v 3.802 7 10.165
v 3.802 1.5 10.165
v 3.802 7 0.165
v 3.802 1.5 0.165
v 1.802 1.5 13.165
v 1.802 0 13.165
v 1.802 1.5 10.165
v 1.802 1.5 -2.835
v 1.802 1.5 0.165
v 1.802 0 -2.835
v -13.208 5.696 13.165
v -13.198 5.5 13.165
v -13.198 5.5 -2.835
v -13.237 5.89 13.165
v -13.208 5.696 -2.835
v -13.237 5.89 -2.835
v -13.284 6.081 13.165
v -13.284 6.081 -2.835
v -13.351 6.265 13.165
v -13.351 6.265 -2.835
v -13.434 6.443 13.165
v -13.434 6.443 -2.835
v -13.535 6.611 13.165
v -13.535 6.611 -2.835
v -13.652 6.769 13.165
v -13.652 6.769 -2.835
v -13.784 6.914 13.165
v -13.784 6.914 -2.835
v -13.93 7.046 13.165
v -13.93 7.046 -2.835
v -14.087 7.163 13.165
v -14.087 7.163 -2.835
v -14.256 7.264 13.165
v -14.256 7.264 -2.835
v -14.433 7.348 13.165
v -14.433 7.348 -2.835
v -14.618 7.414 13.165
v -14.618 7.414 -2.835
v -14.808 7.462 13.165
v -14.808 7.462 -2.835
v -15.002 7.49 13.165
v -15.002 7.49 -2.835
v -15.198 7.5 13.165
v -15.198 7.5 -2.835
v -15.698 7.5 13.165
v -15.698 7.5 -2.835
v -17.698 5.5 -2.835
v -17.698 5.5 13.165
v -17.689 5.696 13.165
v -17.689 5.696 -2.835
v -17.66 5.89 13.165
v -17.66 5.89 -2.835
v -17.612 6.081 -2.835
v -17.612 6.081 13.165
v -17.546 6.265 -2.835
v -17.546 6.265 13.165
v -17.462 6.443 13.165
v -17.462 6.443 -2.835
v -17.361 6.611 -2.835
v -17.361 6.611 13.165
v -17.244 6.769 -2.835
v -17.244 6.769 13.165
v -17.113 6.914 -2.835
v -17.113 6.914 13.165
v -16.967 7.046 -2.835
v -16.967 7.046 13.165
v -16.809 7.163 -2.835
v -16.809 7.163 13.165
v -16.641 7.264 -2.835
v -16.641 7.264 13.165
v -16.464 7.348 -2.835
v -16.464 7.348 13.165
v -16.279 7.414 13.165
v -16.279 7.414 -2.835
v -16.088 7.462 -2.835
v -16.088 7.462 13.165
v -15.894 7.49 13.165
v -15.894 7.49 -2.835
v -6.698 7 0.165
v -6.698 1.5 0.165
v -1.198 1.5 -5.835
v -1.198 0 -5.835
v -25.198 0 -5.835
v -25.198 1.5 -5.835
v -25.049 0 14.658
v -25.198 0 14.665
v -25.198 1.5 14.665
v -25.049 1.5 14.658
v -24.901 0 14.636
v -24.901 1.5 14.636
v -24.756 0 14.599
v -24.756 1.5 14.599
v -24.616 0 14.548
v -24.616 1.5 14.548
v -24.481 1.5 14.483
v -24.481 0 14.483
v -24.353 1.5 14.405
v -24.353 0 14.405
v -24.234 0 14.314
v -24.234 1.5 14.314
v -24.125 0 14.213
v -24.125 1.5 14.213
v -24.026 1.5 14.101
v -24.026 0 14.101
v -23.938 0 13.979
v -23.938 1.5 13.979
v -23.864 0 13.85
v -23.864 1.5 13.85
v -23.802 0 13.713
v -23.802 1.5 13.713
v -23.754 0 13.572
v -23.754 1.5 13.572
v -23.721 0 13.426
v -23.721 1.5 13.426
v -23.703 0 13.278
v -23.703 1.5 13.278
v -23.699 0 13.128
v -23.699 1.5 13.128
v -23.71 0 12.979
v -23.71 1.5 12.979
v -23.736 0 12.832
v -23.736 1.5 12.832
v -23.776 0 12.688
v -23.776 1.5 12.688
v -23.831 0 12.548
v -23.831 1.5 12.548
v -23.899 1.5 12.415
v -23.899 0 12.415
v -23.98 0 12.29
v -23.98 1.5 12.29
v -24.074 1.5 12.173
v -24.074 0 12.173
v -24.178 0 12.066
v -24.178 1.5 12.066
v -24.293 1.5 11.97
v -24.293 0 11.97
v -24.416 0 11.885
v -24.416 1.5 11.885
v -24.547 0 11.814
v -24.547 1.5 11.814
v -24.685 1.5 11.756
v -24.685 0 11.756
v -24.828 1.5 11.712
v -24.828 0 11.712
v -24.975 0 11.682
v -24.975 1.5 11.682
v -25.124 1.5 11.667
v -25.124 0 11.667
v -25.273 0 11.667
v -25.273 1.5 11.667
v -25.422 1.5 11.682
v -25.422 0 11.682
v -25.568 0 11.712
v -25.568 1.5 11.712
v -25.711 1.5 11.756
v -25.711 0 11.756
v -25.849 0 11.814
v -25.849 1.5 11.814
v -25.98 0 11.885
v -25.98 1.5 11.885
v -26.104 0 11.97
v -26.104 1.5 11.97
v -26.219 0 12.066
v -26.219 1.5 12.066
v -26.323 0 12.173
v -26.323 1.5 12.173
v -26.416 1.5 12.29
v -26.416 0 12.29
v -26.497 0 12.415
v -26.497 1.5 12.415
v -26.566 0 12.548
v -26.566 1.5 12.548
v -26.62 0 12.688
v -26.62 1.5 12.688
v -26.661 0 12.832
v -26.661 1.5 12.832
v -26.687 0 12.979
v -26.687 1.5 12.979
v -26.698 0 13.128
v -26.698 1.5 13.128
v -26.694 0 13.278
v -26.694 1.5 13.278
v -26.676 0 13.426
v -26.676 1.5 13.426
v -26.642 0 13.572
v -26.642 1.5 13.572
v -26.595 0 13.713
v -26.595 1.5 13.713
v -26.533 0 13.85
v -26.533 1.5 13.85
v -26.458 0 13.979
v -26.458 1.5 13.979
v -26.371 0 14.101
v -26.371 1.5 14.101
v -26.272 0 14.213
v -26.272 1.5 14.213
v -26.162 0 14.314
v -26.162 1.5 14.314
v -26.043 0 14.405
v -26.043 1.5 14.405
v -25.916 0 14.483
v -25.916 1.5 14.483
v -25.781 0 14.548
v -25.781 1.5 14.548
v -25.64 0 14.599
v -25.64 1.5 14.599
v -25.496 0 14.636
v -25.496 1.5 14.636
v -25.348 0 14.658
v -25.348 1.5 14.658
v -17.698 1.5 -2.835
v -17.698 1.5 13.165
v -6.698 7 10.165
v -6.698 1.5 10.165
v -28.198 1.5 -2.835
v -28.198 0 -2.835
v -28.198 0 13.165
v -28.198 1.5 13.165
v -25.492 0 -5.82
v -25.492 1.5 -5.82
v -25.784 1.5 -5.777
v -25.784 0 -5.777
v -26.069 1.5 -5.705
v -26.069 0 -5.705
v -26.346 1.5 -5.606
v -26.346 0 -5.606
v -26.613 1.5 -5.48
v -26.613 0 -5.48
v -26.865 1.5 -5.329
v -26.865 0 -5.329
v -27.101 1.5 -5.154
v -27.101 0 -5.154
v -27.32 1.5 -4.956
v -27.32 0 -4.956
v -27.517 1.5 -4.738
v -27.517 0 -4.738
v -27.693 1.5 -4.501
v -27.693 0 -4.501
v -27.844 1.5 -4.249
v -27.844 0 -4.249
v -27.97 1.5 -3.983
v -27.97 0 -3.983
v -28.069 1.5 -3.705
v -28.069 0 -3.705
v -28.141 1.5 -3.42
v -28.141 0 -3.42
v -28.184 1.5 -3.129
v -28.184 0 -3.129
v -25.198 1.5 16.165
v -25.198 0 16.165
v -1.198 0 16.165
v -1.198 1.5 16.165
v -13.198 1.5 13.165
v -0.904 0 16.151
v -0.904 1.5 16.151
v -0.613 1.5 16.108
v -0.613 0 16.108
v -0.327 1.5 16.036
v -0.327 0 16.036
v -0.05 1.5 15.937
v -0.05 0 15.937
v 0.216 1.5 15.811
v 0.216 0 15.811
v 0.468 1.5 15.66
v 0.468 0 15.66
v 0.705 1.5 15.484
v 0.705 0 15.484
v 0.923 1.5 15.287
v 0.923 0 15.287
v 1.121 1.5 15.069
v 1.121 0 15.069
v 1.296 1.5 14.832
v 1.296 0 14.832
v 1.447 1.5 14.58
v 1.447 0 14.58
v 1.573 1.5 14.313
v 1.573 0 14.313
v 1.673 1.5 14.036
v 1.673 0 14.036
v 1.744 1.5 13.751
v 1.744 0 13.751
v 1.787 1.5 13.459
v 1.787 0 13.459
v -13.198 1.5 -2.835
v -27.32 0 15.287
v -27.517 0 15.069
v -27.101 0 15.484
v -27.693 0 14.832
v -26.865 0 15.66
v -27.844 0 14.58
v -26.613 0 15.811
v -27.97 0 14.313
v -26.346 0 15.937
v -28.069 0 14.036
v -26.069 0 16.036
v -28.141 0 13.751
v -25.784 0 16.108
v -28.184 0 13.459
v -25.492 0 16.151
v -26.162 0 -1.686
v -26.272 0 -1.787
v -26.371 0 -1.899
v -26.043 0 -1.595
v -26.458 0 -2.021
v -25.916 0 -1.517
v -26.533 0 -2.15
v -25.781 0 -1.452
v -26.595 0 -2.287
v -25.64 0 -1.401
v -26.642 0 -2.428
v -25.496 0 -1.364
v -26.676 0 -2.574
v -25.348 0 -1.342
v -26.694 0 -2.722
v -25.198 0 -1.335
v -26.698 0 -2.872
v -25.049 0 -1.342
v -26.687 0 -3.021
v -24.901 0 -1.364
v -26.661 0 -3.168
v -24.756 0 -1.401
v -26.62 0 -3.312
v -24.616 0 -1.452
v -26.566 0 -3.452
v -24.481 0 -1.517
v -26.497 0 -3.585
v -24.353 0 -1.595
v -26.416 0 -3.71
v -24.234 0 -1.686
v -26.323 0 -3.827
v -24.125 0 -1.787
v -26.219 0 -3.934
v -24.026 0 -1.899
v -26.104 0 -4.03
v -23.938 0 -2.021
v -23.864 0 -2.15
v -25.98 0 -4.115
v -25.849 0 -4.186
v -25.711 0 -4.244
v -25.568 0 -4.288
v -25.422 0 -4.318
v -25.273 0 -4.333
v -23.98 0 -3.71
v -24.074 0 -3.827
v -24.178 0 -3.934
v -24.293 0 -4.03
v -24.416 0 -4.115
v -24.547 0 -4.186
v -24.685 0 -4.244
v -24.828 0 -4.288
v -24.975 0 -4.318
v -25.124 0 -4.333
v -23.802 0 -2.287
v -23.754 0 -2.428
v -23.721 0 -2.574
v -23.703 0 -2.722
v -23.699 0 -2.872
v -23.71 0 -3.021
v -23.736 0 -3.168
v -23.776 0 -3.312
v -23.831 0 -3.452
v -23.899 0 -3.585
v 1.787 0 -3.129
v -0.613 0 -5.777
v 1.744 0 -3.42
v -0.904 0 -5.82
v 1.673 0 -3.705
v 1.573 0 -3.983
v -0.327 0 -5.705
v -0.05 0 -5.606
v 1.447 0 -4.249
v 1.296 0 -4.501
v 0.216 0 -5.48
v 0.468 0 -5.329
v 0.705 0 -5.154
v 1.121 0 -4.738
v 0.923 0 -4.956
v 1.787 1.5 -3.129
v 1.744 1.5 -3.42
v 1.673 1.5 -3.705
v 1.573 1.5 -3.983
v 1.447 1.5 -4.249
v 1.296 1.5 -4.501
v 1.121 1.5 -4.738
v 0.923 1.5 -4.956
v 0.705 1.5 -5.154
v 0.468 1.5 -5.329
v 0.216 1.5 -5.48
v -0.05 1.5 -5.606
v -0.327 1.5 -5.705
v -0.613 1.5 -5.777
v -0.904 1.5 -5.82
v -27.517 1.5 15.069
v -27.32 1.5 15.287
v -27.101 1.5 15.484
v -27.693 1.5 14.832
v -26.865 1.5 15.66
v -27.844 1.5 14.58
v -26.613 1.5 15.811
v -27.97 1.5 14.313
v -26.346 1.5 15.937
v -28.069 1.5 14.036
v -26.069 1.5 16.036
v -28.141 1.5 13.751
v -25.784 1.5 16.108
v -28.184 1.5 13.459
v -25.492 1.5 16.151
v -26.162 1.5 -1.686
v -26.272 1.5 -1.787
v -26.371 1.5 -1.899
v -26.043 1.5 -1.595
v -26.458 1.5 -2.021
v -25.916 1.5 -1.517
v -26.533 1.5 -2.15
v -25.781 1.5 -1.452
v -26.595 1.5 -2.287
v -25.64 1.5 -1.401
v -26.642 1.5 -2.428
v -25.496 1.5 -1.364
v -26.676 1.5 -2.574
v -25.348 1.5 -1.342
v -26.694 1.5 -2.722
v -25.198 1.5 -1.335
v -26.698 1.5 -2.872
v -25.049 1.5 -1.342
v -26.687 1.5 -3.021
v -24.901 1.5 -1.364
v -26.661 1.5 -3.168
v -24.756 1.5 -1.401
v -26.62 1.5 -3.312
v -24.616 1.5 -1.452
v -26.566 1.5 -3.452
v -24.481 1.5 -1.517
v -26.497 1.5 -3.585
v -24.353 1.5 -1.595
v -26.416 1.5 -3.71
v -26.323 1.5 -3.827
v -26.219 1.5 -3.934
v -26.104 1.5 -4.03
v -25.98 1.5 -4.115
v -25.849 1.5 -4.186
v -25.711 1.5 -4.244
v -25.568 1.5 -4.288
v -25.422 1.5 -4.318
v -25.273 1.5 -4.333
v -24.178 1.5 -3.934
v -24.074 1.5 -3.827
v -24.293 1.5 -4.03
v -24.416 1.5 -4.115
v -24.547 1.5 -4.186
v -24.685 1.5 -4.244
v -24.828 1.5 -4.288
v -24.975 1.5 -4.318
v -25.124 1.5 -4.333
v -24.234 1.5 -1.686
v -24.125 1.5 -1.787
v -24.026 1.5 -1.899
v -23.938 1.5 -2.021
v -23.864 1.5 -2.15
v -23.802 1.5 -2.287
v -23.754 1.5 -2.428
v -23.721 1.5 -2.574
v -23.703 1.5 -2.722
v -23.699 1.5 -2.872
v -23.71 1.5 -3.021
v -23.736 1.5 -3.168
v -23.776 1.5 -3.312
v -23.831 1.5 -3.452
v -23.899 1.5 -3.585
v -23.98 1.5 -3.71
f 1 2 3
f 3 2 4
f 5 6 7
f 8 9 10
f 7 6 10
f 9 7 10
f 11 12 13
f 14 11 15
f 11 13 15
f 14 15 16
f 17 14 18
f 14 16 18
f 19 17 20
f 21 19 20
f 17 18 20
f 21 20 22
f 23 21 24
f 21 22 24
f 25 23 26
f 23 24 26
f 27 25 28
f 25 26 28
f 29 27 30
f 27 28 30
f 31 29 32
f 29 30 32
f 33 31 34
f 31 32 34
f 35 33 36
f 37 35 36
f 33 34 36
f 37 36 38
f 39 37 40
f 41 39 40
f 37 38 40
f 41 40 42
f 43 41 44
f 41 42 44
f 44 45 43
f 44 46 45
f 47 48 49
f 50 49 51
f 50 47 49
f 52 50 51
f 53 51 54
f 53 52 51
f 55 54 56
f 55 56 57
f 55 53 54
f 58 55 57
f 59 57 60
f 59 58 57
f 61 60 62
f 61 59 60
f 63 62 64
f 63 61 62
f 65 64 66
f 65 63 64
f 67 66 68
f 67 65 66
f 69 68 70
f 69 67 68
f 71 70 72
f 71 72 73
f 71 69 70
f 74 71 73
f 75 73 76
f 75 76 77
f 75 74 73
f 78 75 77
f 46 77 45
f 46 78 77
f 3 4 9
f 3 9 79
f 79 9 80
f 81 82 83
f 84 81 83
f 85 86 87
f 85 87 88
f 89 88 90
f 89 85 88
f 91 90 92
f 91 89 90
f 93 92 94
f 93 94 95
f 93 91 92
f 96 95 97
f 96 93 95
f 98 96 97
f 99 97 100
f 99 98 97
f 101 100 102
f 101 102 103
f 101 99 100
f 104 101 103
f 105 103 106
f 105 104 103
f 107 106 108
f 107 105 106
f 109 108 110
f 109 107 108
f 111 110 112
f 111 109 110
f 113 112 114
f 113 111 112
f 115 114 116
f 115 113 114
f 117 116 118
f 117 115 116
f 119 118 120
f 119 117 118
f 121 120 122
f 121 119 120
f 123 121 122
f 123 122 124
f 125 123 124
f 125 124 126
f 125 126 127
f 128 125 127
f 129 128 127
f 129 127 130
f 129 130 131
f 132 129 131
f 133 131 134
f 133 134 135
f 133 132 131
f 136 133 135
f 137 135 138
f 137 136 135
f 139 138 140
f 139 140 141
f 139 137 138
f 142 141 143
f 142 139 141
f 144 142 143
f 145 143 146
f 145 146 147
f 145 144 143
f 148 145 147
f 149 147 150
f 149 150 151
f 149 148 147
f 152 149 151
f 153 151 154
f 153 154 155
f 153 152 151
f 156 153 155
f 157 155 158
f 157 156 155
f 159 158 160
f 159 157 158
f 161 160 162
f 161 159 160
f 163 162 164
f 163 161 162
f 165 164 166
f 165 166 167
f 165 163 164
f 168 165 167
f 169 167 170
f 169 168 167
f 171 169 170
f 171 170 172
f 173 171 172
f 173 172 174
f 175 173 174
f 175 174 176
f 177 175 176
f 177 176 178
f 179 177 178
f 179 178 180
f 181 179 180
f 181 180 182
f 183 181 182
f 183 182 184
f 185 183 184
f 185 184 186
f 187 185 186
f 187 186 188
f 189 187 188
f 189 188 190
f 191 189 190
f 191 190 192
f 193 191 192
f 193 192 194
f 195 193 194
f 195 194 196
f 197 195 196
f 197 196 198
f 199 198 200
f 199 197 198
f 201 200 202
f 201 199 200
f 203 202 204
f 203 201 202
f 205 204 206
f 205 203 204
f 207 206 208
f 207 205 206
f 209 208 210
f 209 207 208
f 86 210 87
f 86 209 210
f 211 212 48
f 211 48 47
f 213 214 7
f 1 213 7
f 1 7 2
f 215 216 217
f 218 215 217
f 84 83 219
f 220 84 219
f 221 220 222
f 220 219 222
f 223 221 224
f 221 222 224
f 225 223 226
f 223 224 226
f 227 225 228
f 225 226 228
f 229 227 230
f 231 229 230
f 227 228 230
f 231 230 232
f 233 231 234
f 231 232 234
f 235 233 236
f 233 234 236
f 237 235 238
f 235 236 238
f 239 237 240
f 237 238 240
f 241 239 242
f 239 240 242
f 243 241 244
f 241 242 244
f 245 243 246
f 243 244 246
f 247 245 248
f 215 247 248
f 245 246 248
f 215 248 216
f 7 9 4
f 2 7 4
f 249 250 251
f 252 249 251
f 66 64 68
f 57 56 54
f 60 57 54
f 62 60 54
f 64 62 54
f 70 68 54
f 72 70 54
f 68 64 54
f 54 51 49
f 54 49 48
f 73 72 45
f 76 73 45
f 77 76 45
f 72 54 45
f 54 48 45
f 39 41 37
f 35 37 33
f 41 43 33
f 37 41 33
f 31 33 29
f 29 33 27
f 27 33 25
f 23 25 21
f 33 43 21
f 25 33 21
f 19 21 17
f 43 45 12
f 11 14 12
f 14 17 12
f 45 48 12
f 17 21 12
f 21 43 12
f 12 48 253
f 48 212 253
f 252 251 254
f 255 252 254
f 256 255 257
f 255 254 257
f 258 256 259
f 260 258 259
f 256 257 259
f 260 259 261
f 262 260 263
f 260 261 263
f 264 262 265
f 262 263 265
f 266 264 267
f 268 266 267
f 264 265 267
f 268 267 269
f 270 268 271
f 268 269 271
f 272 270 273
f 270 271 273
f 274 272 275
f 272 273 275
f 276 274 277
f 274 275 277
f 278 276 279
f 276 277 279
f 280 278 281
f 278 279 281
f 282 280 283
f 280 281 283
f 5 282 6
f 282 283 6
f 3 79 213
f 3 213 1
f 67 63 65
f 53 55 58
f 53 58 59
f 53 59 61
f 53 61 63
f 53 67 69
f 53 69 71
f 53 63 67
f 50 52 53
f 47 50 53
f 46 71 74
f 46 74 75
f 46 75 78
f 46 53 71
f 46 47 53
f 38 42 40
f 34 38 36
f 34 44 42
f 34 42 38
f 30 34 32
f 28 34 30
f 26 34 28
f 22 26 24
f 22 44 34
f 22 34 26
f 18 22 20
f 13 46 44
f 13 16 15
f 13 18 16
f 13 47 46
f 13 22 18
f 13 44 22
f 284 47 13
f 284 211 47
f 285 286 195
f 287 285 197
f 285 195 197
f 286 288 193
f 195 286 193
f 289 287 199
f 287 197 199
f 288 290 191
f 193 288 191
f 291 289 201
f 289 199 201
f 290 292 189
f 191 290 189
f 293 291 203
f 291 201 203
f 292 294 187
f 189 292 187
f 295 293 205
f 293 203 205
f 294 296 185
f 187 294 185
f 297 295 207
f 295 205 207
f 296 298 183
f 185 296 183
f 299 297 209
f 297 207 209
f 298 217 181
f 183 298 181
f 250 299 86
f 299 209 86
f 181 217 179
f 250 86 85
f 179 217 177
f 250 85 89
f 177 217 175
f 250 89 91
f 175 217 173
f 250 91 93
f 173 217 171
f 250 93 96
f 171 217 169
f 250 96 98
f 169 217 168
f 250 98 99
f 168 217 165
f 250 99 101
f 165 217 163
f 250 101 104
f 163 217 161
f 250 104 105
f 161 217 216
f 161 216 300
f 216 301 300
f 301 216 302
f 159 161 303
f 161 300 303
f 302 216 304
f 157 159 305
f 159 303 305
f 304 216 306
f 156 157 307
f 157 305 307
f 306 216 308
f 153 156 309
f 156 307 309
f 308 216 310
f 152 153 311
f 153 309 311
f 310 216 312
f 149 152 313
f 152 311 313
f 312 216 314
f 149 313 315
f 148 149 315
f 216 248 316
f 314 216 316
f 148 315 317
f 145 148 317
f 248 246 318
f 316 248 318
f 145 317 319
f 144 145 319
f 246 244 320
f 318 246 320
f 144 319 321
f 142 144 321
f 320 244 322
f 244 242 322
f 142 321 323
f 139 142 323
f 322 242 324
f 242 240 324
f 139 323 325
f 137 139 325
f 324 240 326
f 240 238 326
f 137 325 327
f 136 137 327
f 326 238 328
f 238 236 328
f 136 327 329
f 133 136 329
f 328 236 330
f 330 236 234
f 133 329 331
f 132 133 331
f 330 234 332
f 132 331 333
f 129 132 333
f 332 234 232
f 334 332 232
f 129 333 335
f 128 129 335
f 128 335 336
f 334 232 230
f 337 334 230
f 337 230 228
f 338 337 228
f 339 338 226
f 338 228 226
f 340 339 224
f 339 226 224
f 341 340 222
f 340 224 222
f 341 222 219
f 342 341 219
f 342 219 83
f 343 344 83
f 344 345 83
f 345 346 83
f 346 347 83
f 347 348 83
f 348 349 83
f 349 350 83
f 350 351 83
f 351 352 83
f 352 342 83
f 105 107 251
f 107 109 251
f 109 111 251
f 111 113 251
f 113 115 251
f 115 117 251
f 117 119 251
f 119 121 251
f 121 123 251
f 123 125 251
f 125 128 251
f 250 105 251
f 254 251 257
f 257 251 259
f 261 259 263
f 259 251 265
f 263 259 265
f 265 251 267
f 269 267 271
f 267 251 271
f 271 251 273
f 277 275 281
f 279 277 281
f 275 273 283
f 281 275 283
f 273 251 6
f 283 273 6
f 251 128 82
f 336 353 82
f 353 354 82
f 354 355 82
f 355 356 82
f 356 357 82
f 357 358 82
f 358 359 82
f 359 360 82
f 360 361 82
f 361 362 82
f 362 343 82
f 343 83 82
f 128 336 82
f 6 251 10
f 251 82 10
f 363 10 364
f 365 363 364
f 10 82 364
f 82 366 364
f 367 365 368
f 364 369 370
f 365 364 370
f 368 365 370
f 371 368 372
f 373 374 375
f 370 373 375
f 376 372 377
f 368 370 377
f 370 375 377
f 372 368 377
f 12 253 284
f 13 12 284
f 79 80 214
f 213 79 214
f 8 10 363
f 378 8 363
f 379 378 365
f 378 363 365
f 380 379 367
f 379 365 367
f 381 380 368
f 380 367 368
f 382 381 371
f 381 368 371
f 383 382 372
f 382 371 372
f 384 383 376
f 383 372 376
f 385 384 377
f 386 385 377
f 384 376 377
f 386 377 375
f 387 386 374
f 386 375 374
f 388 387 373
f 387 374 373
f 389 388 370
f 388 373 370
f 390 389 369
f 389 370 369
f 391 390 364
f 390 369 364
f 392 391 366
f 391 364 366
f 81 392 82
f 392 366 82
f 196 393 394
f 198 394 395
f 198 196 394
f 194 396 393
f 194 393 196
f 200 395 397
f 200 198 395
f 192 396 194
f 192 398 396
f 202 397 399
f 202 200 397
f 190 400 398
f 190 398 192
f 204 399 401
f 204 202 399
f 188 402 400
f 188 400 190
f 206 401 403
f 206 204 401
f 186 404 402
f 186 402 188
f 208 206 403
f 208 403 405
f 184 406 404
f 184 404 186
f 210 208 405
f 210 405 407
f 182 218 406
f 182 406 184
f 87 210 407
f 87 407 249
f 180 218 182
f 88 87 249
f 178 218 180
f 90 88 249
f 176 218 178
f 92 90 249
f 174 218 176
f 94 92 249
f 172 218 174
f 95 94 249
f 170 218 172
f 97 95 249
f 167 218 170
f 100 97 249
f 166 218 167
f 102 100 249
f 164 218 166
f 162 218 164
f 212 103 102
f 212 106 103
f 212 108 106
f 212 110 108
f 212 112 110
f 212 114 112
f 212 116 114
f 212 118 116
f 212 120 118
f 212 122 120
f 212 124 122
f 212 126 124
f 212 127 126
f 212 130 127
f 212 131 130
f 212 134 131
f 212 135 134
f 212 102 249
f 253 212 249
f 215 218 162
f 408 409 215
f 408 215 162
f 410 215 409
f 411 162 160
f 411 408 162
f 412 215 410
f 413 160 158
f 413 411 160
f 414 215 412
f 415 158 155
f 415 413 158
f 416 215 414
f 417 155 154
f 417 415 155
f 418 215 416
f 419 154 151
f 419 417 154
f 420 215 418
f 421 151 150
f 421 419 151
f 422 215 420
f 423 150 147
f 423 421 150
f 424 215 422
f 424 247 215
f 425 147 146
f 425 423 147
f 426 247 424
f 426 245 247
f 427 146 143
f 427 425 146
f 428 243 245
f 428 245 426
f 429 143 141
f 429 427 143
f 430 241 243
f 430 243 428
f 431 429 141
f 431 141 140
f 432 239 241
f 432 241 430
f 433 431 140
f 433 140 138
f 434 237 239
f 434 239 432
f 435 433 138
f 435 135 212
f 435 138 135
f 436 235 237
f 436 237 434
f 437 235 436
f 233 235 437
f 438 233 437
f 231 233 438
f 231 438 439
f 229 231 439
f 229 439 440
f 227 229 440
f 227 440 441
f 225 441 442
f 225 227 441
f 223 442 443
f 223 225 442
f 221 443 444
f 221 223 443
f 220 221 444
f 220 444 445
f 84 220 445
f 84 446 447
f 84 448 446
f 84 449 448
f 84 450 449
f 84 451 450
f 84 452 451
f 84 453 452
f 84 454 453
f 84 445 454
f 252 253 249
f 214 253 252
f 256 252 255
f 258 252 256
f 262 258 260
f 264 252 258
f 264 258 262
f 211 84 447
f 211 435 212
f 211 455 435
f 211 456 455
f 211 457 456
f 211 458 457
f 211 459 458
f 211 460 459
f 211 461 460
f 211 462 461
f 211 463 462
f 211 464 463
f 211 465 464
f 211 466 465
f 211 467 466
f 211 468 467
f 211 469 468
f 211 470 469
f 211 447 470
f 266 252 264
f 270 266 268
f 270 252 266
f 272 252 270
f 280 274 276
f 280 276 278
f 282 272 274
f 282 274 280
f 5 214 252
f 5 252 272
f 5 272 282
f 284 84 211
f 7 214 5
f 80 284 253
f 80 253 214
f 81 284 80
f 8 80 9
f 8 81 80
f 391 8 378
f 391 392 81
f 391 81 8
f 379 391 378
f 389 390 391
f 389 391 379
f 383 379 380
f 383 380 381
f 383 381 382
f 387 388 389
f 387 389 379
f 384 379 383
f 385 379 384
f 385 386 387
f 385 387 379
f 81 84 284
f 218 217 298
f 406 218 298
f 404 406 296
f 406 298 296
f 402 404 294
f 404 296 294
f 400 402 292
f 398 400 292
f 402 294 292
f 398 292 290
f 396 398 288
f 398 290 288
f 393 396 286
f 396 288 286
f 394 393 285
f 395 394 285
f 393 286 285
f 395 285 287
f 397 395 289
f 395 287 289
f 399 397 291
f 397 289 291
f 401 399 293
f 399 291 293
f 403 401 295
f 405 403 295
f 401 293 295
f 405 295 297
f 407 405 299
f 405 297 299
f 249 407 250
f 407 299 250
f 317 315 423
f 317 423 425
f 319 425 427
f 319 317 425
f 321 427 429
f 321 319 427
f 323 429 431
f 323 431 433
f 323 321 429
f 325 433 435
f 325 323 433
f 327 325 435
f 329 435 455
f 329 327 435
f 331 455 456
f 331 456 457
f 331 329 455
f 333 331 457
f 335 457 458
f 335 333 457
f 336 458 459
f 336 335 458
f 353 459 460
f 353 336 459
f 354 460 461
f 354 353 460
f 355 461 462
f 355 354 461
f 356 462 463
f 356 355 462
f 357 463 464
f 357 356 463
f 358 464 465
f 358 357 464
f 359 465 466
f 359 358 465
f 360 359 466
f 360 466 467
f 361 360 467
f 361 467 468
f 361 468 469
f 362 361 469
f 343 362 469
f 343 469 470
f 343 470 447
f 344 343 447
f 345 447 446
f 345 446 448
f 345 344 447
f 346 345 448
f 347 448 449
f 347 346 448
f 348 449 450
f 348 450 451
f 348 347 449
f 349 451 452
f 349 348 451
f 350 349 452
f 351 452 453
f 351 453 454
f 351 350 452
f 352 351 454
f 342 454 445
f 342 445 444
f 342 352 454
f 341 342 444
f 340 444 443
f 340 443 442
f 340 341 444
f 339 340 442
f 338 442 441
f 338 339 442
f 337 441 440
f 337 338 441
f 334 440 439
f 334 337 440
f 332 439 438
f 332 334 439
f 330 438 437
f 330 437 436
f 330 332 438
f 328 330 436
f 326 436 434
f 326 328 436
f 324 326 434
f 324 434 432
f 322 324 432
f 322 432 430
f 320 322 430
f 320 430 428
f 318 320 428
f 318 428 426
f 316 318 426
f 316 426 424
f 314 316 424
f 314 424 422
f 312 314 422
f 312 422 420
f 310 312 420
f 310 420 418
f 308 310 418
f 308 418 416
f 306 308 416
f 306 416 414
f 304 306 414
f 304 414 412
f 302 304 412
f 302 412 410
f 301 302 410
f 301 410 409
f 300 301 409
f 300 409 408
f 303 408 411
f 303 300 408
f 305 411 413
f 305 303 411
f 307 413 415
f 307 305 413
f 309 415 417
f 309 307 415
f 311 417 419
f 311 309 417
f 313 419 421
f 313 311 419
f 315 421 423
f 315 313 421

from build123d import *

# Parameters (mm, degrees)
SKETCH_1_R      = 1.5
EXTRUDE_1_DEPTH = 1.5
EXTRUDE_2_DEPTH = 5.5
SKETCH_3_W      = 4.5
SKETCH_3_H      = 16
EXTRUDE_3_DEPTH = 6
FILLET_1_R      = 2


with BuildPart() as part:
    # Эскиз1 → Бобышка-Вытянуть1 (new body)
    with BuildSketch(Plane(origin=(0, 0, 0), x_dir=(1, 0, 0), z_dir=(0, 1, 0))):
        with BuildLine():
            Line((-28.198313686, 2.834587413), (-28.198313686, -13.165412587))
            ThreePointArc((-28.198313686, -13.165412587), (-27.31963403, -15.286732931), (-25.198313686, -16.165412587))
            Line((-25.198313686, -16.165412587), (-1.198313686, -16.165412587))
            ThreePointArc((-1.198313686, -16.165412587), (0.923006657, -15.286732931), (1.801686314, -13.165412587))
            Line((1.801686314, -13.165412587), (1.801686314, 2.834587413))
            ThreePointArc((1.801686314, 2.834587413), (0.923006657, 4.955907756), (-1.198313686, 5.834587413))
            Line((-1.198313686, 5.834587413), (-25.198313686, 5.834587413))
            ThreePointArc((-25.198313686, 5.834587413), (-27.31963403, 4.955907756), (-28.198313686, 2.834587413))
        make_face()
        with Locations(Location((-25.198313686, -13.165412587, 0), (0, 0, 270))):
            Circle(SKETCH_1_R, mode=Mode.SUBTRACT)
        with Locations(Location((-25.198313686, 2.834587413, 0), (0, 0, 270))):
            Circle(SKETCH_1_R, mode=Mode.SUBTRACT)
    extrude(amount=EXTRUDE_1_DEPTH)

    # Эскиз2 → Бобышка-Вытянуть2 (add)
    with BuildSketch(Plane(origin=(0, 1.5, 0), x_dir=(1, 0, 0), z_dir=(0, 1, 0))):
        Polygon((1.801686314, -0.165412587), (-6.698313686, -0.165412587), (-6.698313686, -10.165412587), (1.801686314, -10.165412587), (3.801686314, -10.165412587), (3.801686314, -0.165412587), align=None)
    extrude(amount=EXTRUDE_2_DEPTH)

    # Эскиз3 → Бобышка-Вытянуть3 (add)
    with BuildSketch(Plane(origin=(0, 1.5, 0), x_dir=(1, 0, 0), z_dir=(0, 1, 0))):
        with Locations((-15.448313686, -5.165412587)):
            Rectangle(SKETCH_3_W, SKETCH_3_H)
    extrude(amount=EXTRUDE_3_DEPTH)

    # Скругление1
    fillet_1_edges = [part.edges().sort_by_distance(p)[0] for p in [
        (-17.698313686, 7.5, 5.165412587),
        (-13.198313686, 7.5, 5.165412587),
    ]]
    fillet(fillet_1_edges, radius=FILLET_1_R)


solid = part.part
